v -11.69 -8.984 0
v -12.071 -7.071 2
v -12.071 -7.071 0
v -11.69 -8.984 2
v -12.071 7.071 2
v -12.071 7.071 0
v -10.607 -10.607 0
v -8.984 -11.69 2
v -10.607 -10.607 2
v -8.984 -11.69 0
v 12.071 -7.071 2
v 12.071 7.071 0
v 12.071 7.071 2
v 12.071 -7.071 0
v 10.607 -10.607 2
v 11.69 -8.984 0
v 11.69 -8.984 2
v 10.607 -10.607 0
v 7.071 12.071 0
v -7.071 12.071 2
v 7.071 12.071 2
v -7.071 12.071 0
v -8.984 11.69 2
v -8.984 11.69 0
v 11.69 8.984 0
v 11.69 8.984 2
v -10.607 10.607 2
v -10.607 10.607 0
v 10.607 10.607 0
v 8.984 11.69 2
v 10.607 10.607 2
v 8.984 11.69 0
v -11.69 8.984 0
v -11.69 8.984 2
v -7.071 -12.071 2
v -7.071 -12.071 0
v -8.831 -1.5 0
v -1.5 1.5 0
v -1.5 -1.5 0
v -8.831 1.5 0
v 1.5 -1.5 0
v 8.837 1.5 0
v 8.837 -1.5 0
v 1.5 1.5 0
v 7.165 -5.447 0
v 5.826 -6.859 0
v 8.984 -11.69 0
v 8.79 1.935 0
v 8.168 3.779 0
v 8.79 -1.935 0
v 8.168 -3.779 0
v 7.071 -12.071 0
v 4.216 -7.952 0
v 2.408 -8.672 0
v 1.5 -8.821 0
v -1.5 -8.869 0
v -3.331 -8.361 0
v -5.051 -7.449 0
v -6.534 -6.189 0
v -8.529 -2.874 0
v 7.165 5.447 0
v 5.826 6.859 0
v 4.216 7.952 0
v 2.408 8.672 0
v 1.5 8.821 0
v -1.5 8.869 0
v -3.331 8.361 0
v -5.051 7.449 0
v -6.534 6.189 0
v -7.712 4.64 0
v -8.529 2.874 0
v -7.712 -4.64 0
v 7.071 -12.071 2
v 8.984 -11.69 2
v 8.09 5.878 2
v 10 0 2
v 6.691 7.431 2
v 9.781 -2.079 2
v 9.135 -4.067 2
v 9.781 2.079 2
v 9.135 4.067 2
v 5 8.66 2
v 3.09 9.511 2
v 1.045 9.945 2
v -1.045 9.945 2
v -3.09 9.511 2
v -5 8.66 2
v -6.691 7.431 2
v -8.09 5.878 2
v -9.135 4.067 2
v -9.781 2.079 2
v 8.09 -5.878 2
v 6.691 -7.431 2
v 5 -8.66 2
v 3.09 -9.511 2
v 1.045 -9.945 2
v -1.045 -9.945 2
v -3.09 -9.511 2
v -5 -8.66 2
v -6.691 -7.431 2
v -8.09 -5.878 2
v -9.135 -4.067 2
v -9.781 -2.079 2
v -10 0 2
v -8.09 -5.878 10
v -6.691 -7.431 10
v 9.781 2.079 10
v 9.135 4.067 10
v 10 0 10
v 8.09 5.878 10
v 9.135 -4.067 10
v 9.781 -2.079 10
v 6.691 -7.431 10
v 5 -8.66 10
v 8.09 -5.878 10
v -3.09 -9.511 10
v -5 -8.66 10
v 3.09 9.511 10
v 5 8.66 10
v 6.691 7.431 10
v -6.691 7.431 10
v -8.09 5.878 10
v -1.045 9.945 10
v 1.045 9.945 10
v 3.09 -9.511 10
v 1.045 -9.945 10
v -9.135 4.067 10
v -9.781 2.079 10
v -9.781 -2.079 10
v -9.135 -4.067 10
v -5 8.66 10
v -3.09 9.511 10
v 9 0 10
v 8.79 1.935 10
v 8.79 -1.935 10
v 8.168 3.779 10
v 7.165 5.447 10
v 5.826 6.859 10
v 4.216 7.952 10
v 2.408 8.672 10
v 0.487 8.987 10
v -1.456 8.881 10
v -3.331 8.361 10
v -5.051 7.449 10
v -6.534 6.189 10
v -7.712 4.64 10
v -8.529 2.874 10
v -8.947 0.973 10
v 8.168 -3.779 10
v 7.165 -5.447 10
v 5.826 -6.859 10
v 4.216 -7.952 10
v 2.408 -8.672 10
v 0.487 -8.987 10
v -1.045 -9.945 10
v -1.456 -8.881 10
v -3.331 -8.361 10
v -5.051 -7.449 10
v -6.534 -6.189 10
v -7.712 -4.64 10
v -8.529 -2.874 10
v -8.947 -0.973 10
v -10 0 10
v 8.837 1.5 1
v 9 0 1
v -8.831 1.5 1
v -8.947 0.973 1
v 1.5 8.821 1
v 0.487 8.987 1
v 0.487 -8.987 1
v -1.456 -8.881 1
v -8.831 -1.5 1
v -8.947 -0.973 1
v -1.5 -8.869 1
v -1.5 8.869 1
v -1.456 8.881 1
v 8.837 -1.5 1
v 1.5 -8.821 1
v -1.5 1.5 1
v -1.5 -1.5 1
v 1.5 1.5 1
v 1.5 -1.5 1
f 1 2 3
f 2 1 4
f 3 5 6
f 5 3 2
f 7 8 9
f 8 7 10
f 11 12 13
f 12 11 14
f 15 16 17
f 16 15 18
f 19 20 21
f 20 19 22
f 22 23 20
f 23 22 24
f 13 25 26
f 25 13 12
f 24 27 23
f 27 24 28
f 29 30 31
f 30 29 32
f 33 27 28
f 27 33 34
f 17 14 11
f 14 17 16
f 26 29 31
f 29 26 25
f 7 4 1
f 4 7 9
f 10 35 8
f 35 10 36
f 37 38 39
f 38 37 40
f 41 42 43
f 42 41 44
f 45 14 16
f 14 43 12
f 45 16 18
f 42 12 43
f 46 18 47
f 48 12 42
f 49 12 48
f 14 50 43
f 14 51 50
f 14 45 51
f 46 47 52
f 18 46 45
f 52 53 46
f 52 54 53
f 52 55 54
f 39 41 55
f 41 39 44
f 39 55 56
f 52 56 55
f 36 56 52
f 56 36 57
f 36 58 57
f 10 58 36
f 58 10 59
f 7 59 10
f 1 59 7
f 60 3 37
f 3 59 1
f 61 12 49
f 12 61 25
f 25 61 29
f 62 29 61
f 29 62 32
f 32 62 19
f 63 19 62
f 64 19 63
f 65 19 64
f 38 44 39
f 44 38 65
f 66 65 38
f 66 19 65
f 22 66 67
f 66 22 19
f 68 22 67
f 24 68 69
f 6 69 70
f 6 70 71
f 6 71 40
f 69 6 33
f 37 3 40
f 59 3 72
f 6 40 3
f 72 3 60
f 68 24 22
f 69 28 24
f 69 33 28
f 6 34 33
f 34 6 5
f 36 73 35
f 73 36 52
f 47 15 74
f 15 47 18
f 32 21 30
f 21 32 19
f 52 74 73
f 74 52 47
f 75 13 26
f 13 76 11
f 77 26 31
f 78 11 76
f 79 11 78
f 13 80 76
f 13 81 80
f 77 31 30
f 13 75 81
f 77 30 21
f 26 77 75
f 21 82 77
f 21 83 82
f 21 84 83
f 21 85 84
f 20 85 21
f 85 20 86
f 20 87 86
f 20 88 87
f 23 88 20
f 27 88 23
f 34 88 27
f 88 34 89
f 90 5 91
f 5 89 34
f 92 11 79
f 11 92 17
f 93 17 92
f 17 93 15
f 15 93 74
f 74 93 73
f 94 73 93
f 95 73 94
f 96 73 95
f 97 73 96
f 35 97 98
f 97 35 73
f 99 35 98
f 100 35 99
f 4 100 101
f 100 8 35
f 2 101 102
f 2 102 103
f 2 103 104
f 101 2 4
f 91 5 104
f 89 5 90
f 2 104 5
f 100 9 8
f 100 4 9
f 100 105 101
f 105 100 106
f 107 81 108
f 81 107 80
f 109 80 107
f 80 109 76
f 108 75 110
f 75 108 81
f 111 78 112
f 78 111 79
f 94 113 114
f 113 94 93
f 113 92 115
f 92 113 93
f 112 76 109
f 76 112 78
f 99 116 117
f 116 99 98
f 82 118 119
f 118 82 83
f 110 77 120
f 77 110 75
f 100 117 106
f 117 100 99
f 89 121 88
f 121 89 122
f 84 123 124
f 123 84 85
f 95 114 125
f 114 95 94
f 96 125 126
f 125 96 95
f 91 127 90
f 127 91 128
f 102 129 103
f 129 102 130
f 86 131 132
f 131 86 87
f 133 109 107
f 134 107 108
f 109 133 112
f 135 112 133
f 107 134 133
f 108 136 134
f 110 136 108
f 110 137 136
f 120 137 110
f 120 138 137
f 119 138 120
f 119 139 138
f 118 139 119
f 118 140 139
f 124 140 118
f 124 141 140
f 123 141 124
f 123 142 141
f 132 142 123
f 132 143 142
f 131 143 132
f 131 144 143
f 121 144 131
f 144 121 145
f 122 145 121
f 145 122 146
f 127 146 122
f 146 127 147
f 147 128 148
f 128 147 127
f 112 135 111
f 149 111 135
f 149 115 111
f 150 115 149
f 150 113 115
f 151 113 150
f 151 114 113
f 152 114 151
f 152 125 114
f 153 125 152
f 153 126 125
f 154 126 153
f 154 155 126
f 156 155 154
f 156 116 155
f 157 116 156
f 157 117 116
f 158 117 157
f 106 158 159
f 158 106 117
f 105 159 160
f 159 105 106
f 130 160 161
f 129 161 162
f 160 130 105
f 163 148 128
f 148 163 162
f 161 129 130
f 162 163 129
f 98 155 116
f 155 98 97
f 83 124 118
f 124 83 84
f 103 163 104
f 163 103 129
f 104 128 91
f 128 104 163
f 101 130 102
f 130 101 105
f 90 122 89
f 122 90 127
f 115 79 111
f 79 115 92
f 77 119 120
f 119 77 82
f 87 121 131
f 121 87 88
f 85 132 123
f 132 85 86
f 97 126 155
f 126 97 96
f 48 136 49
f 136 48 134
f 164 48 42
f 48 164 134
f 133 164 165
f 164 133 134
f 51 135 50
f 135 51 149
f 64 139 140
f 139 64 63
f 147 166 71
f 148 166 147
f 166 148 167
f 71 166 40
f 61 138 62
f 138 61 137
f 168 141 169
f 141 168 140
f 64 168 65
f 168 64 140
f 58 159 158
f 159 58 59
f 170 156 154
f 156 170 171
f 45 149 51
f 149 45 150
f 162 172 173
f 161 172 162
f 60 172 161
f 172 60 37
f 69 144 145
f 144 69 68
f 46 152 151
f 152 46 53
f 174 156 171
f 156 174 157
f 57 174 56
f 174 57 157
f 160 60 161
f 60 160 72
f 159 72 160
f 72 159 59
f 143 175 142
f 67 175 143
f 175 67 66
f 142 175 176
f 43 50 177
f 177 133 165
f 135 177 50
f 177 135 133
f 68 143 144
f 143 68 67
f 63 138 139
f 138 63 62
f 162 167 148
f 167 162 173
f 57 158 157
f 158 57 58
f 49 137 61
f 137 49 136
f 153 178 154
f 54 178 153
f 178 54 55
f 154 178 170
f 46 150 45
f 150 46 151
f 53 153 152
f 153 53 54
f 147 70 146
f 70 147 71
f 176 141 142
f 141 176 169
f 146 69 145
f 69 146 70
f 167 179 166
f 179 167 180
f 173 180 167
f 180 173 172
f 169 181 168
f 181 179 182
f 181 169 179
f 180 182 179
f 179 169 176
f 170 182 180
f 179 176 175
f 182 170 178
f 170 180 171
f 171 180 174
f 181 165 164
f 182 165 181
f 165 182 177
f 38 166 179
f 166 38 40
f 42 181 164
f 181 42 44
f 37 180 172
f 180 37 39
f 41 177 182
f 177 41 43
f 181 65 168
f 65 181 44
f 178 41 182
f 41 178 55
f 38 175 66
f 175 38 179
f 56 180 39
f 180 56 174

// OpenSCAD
module cross(width, height, crosswidth=1) {
    union() {
        translate([0, 0, height/2])
            cube([width, crosswidth, height], center=true);
        translate([0, 0, height/2])
            cube([crosswidth, width, height], center=true);
    }
}

module base() {
    hull() {
        rotate([0, 0, 45])
        for(corner = [0, 1, 2, 3]) {
            rotate([0, 0, corner*90])
            translate([10, 0, 0])
            cylinder(d=10, h=2);
        }
    }
}

union() {
    difference() {
        union() {
            base();
            cylinder(d=20, h=10);
        }
        cylinder(d=18, h=30, center=true);
    }
    
    cross(19.5, 1, crosswidth=3);
}
